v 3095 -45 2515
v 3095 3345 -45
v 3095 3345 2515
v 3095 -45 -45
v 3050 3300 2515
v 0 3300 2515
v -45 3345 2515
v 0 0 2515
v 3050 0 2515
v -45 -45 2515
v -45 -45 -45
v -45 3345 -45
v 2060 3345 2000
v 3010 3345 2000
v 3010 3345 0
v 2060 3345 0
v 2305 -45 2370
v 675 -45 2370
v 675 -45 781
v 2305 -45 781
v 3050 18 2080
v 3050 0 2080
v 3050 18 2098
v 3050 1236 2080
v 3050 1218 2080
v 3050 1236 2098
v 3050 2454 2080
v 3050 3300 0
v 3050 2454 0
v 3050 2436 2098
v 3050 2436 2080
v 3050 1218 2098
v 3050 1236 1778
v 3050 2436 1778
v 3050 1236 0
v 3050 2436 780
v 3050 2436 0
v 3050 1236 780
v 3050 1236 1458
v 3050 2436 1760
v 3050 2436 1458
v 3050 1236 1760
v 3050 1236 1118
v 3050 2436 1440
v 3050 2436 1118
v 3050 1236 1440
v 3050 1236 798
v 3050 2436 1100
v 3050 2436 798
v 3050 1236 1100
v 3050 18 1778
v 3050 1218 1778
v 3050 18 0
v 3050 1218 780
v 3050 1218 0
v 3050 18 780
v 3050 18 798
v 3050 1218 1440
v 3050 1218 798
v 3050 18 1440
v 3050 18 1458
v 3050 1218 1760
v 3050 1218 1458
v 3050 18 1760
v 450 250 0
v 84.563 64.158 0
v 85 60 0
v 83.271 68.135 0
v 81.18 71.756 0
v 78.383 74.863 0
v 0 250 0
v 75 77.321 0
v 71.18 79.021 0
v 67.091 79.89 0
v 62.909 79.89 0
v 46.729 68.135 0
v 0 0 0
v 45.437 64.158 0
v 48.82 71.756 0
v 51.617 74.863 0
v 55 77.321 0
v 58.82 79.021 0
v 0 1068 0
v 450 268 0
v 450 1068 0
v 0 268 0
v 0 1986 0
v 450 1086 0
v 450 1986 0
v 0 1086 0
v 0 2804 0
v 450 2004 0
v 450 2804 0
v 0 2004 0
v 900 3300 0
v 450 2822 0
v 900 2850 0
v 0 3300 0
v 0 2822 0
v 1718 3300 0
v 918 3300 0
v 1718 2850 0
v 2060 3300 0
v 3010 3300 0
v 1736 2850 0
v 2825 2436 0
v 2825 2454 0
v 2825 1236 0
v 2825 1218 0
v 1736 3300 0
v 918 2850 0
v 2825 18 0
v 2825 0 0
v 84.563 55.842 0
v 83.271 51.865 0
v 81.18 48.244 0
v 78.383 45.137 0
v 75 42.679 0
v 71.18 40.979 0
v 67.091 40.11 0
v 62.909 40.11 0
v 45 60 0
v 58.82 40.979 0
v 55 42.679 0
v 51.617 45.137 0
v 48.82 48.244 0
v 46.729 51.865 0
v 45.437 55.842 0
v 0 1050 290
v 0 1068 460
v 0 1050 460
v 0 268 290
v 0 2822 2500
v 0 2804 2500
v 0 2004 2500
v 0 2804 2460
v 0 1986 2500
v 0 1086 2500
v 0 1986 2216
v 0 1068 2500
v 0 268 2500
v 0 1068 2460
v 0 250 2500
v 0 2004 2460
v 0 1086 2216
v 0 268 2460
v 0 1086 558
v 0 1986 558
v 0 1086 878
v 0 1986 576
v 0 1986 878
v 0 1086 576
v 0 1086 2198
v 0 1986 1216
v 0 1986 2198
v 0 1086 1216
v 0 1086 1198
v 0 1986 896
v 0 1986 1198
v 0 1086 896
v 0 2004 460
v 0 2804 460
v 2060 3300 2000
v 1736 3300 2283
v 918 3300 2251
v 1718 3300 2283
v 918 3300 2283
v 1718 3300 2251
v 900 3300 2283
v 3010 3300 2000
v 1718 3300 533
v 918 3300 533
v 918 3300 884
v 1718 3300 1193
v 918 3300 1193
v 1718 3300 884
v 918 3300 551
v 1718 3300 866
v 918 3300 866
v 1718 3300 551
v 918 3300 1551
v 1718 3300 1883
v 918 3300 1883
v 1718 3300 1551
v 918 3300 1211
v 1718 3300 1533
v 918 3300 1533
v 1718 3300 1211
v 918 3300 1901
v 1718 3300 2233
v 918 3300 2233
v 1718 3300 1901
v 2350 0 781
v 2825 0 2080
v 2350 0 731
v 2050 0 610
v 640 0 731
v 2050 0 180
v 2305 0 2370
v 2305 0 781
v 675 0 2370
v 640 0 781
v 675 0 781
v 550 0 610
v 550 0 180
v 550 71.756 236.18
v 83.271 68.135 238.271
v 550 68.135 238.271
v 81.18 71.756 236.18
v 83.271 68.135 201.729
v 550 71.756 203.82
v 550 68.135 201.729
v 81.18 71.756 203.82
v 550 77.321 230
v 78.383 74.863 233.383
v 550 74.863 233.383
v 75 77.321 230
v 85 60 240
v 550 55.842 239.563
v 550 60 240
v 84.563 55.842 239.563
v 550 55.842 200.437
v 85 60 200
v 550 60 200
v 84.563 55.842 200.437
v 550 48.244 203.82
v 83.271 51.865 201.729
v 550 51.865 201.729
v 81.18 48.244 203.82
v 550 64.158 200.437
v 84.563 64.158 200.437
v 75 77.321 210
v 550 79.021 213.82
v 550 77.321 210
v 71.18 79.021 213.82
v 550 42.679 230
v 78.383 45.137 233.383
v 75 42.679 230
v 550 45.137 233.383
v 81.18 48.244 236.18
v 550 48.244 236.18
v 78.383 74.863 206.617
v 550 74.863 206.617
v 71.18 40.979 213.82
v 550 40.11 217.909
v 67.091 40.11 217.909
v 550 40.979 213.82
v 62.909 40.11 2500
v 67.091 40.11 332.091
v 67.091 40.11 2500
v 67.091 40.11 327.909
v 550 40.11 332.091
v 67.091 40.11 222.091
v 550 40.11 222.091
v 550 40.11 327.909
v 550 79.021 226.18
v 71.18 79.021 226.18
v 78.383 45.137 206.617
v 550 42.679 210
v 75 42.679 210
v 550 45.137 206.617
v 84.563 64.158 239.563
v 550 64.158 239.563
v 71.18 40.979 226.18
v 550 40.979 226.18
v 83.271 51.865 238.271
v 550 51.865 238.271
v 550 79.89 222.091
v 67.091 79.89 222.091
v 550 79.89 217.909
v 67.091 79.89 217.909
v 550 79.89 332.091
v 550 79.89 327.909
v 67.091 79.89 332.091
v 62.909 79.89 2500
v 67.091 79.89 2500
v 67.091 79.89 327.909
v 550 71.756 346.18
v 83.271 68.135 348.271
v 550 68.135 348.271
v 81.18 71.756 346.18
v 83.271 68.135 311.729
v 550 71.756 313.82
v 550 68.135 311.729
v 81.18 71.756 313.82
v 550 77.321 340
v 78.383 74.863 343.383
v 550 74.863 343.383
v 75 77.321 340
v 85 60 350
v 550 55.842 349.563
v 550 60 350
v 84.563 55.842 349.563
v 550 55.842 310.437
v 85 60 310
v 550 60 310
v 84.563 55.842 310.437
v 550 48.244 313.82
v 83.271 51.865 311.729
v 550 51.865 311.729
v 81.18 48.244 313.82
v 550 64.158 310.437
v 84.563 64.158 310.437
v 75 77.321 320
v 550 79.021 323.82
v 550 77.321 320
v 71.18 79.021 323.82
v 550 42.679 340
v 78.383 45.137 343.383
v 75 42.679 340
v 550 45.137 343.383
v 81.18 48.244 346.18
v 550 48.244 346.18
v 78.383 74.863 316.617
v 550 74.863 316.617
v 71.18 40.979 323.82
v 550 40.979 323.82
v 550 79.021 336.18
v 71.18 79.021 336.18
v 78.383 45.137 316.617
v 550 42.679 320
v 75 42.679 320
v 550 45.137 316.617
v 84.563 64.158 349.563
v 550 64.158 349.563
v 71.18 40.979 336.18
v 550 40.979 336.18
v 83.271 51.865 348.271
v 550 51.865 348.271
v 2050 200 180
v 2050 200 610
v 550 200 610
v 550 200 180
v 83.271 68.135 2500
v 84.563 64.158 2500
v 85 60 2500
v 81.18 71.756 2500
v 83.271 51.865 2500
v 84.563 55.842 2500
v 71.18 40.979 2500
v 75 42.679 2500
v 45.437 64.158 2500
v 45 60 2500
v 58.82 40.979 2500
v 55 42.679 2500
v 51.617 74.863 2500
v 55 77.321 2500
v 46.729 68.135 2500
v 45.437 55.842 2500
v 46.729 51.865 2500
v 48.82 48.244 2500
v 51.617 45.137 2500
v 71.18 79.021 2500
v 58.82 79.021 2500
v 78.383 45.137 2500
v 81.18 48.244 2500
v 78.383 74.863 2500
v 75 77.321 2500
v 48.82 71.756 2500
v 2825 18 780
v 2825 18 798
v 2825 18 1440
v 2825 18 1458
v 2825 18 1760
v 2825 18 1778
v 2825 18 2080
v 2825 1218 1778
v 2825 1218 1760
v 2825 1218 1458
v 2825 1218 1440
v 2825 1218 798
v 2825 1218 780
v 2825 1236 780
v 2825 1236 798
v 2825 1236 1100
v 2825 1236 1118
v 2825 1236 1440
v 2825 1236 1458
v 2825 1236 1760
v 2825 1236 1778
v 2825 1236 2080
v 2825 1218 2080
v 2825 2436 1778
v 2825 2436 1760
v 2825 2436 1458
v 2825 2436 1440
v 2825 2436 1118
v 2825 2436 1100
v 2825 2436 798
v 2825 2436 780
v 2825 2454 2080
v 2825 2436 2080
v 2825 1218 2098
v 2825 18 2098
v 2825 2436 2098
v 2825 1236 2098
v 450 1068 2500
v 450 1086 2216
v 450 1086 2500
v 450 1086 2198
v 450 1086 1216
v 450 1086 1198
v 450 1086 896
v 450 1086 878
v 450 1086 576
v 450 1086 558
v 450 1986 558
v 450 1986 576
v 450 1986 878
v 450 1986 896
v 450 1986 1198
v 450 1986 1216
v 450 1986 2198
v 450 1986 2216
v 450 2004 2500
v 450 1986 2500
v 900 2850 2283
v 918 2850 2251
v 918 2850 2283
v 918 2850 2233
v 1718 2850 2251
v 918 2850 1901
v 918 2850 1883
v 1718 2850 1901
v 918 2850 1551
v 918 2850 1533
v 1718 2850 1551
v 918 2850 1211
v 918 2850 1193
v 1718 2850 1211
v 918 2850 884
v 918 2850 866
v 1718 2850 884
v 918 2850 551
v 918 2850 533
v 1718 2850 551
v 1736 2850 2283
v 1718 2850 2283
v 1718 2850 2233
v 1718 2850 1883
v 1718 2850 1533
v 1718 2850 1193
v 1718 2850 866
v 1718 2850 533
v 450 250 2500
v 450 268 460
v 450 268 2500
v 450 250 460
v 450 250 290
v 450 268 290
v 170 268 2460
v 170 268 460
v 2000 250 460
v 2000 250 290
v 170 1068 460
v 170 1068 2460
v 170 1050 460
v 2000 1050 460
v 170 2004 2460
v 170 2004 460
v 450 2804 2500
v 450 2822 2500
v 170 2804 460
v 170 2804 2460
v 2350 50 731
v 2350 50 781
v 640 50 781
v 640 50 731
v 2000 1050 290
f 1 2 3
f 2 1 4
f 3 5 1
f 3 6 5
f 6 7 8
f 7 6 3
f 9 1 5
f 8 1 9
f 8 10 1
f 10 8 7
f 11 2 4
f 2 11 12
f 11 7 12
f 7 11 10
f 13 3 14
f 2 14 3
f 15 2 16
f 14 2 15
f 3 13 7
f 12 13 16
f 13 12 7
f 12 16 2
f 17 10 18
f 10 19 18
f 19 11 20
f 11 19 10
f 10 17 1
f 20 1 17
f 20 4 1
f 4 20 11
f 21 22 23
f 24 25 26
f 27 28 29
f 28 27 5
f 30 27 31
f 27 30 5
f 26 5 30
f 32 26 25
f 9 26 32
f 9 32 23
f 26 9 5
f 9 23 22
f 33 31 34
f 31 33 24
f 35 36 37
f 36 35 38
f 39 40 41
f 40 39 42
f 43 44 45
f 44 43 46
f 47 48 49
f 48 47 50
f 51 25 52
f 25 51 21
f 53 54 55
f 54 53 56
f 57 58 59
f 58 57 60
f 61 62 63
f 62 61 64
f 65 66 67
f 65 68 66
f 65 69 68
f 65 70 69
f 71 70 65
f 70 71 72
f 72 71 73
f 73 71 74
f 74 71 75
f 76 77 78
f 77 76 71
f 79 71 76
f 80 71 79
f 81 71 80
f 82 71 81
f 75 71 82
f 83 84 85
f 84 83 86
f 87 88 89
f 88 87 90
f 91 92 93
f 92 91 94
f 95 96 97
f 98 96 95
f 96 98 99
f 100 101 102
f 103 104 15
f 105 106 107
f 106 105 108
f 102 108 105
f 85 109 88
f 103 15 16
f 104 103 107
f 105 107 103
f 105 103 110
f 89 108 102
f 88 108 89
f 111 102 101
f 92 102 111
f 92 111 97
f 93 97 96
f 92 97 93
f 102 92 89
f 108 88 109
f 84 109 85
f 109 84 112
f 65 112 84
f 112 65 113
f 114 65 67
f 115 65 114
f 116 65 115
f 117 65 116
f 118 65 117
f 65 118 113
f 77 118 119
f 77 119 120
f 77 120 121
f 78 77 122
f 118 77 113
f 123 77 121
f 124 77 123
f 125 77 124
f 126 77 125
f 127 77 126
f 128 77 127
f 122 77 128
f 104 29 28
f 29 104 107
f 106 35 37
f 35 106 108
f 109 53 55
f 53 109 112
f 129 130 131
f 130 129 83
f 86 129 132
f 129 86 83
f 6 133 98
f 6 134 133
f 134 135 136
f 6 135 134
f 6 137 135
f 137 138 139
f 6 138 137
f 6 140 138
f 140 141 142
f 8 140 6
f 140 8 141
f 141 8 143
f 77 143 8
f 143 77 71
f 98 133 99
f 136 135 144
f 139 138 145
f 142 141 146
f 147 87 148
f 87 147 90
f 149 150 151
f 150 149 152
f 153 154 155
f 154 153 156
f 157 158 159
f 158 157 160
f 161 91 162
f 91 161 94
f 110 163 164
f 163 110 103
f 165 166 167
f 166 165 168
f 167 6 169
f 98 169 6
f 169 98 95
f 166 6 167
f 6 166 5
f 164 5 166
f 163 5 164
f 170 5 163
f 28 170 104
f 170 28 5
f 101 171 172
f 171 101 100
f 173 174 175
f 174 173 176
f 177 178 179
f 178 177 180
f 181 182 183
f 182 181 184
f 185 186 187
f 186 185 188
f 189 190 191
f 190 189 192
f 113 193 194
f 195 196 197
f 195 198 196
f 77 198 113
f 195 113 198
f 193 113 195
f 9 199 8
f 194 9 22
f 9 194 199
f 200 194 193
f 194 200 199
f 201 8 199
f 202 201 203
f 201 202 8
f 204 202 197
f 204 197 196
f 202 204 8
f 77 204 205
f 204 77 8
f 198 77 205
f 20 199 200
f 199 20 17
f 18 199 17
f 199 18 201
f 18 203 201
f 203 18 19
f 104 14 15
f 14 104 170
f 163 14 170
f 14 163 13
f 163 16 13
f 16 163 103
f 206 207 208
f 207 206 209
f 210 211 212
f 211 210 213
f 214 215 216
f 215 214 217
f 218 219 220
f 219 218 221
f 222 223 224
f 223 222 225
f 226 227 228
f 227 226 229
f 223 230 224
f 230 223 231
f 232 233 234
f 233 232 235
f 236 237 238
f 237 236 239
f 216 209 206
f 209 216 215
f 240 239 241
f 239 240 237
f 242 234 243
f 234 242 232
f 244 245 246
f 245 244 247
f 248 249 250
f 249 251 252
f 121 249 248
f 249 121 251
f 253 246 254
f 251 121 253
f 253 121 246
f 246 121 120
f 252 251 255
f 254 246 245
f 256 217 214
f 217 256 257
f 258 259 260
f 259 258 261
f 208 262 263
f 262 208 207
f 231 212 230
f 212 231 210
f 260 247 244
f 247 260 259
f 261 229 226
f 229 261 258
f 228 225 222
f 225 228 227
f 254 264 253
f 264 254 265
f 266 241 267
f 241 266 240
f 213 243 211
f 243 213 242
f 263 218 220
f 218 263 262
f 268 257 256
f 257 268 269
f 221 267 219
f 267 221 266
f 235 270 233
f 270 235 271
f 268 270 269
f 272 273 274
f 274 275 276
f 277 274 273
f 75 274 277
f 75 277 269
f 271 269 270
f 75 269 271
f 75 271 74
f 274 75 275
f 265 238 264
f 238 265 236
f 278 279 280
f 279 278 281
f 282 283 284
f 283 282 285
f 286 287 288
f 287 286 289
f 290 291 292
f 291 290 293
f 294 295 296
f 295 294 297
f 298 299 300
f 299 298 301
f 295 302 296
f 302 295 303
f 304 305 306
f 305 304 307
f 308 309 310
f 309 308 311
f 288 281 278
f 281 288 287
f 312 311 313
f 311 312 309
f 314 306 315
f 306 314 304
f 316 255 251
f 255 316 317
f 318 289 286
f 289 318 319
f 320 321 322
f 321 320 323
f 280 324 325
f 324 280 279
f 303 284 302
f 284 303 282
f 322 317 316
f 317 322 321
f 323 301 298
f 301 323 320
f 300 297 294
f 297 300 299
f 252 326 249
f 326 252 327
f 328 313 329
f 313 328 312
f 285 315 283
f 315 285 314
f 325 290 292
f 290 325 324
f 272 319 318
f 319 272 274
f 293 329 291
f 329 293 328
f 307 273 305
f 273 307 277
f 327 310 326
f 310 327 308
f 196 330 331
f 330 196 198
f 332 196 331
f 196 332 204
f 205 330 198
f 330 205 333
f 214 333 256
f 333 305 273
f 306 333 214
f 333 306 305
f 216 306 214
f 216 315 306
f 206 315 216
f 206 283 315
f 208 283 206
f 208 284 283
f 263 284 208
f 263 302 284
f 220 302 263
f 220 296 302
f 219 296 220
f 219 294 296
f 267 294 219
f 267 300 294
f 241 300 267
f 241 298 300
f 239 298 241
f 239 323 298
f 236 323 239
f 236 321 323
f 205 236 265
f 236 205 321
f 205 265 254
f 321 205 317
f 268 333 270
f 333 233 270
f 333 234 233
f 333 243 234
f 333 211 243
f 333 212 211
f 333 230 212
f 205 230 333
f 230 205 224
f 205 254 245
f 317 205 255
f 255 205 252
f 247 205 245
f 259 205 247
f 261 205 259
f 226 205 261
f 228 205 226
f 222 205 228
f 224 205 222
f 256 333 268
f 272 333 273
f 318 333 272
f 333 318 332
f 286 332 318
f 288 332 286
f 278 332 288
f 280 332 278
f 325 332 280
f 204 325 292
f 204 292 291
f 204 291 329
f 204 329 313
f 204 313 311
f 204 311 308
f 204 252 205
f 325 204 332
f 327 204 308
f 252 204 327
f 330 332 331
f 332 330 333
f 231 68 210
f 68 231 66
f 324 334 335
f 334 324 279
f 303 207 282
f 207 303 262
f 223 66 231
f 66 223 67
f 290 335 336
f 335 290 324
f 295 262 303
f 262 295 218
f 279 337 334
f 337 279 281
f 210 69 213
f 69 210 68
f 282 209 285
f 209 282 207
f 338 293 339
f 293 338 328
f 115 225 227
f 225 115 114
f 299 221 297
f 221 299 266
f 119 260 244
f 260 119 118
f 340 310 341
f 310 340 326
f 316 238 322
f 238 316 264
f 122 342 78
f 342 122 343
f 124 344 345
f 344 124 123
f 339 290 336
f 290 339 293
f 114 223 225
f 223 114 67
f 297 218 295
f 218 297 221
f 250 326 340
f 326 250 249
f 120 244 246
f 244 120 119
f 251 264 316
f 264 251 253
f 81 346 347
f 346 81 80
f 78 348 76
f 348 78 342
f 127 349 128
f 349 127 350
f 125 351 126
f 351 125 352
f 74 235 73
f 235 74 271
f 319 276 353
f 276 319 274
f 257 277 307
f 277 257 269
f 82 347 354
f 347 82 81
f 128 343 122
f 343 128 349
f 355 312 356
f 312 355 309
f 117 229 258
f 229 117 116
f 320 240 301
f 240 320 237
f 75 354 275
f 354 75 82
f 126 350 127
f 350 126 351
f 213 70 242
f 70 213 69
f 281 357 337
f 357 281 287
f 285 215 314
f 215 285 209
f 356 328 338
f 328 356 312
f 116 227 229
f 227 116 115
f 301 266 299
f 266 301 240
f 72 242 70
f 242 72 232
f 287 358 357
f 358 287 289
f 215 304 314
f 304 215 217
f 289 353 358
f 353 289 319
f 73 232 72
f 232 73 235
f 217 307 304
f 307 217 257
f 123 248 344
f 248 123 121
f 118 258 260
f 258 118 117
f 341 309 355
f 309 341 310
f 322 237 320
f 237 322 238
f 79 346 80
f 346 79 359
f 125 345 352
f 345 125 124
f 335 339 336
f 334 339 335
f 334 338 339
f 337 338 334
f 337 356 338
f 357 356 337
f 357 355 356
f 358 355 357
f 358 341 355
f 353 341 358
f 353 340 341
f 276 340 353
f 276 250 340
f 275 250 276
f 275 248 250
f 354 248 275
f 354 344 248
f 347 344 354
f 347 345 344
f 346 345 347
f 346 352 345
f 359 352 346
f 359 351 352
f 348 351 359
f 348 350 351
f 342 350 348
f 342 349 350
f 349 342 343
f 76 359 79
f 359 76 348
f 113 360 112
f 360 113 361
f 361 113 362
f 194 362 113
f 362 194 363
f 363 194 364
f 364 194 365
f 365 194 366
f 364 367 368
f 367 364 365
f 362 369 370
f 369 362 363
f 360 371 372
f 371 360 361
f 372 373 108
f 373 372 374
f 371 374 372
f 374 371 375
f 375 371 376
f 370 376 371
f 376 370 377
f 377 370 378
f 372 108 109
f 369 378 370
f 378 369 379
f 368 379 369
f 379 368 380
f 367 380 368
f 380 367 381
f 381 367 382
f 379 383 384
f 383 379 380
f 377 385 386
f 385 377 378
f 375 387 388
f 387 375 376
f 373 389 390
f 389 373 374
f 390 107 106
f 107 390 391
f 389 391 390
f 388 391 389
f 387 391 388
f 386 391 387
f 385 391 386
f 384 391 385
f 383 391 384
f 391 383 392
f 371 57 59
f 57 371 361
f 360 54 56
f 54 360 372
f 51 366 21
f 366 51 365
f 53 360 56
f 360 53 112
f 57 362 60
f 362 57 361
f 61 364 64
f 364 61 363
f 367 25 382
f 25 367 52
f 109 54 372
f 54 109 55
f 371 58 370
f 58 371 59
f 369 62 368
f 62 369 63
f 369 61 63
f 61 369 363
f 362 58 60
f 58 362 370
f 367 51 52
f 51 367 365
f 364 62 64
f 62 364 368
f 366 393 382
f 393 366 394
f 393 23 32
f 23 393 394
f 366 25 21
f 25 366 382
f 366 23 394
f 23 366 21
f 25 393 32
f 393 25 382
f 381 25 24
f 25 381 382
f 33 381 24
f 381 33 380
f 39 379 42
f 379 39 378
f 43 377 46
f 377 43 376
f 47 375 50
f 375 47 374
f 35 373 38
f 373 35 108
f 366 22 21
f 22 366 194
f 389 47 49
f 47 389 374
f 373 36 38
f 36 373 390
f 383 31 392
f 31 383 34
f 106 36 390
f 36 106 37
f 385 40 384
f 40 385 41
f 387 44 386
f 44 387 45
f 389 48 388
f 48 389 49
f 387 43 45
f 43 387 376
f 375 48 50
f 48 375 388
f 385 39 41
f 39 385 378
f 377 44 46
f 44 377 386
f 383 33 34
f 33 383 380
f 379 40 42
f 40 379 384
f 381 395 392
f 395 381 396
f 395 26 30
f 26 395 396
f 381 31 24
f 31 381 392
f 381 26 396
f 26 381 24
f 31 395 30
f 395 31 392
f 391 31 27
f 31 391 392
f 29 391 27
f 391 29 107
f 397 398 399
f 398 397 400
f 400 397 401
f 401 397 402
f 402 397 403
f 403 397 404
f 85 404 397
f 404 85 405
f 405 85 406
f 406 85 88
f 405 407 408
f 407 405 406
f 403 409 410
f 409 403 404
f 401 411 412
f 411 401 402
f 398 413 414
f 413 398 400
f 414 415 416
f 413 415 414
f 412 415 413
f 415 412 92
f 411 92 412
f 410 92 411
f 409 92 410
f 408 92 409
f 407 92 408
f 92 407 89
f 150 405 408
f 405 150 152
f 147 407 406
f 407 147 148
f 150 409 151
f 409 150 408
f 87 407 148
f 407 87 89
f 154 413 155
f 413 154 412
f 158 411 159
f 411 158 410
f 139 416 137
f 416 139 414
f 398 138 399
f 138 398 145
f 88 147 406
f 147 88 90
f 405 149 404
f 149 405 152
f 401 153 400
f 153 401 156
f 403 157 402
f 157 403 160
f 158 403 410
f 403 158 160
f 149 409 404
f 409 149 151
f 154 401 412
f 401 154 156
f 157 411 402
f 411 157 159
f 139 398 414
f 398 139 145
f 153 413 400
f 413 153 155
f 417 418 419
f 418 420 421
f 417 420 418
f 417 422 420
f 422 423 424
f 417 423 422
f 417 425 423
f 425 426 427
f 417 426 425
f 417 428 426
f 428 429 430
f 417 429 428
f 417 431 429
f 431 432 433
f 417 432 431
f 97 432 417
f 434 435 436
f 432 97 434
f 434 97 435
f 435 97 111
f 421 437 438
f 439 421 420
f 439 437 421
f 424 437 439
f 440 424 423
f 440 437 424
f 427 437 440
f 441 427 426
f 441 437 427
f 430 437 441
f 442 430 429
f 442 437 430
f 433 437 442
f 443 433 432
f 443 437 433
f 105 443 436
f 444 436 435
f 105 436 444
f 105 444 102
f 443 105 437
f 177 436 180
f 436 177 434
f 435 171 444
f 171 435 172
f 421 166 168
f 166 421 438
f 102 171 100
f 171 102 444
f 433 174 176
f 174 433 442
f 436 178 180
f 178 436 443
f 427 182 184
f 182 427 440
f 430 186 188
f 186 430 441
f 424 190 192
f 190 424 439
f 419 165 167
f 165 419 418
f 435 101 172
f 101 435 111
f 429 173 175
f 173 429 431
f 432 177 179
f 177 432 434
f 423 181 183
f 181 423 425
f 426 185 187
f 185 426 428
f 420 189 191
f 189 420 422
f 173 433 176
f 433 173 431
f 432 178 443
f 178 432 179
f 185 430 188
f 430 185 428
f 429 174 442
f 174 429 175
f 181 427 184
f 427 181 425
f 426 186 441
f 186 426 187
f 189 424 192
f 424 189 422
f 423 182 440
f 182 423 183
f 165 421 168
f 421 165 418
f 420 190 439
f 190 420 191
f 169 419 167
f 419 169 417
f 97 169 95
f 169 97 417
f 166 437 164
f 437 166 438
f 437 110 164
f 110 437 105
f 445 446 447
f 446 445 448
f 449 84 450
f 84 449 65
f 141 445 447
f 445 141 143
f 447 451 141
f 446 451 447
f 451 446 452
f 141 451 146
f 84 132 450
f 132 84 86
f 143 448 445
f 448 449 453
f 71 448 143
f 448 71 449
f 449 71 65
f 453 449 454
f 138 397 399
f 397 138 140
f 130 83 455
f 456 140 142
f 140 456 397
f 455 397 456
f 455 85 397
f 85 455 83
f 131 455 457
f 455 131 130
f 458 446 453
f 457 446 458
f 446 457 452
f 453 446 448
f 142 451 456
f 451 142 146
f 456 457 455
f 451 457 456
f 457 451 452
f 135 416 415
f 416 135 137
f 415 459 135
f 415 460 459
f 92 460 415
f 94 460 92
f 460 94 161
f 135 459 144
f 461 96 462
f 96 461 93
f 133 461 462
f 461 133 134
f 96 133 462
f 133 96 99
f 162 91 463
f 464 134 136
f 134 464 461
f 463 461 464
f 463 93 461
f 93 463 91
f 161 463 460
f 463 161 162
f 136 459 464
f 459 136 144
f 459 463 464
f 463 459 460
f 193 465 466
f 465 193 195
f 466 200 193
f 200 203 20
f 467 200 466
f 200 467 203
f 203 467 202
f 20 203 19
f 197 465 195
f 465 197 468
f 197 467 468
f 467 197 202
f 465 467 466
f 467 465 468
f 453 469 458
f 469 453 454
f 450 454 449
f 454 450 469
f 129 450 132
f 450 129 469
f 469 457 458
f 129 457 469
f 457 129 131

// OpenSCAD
/*
Based on the layout of the II-57 series house
tipdoma.com/2009/10/ceriya-ii-57/
*/


// ===========================================================
// ===========================================================
// !!! BLOCK OF ROOM`S BASE!!!
// SIZES (high, lenght, width)
room_high = 2560;
room_length = 3300;
room_width = 3050;
// wall`s thickness
room_thick_wall = 90;
// window`s cube
window_high = 1590;
window_length = 1630;
window_width = room_thick_wall * 2;
// window`s coord by wall
dX_window = 675;
dY_window = -room_thick_wall;
dZ_window = 780;
// door`s cube
door_high = 2000;
door_length = 950;
door_width = room_thick_wall * 2;
// door`s ccord by wall
door_X = room_width - door_length - 40;
// ===========================================================
// !!! DRAW ROOM BASE !!!
//set white color for all
color("lightsalmon", 1)
{
    difference()
    {
        // base for draw walls of room
        translate([-room_thick_wall/2, -room_thick_wall/2, -room_thick_wall/2])
        cube([room_width + room_thick_wall, room_length+room_thick_wall, room_high]);

        // base for room self
        translate([0, 0, 0])
        cube([room_width, room_length, room_high]);
        
        // base for draw window
        translate([dX_window, dY_window, dZ_window])
        cube([window_length, window_width, window_high]);
    
        // base for door
        translate([door_X, room_length-room_thick_wall/2, 0])
        cube([door_length, door_width, door_high]);
    }
}


// ===========================================================
// ===========================================================
// !!! BLOCK OF WINDOWSILL !!!
// SIZES
windowsill_length = 1710;
windowsill_width = 95;
windowsill_high = 50;
dX_windowsill = 640;
dY_windowsill = -45;
dZ_windowsill = 731;
// ===========================================================
// !!! draw windowsill !!!
color("white", 1)
rotate([0, 0, 0])
translate([dX_windowsill, dY_windowsill, dZ_windowsill])
cube([windowsill_length, windowsill_width, windowsill_high]);

// ===========================================================
// ===========================================================
// !!! BLOCK OF RADIATOR !!!
// SIZES
boiler_length = 1500;
boiler_width = 200;
boiler_high = 430;
dX_boiler = 550;
dY_boiler = 0;
dZ_boiler = 180;
// ===========================================================
// !!! DRAW RADIATOR SET !!!
color("white", 1)
{
// !!! draw radiator !!!
    rotate([0, 0, 0])
    translate([dX_boiler, dY_boiler, dZ_boiler])
    cube([boiler_length, boiler_width, boiler_high]);
// !!! draw vertical tube !!!
    rotate([0, 0, 0])
    translate([65, 60, 0])
    cylinder(r=20, h=2500, center=false);
// !!! draw horizontal tube !!! h = [22, 33]cm
    for(dZ=[220, 330])
    {
        translate([65, 60, dZ])
        rotate([0, 90, 0])
        cylinder(r=20, h=dX_boiler, center=false);
    }
}

// ===========================================================
// ===========================================================
// !!! BLOCK OF SHELF !!!
// SIZES
// constant of shelves
shelf_thick = 18;
shelf_width_S = 225;
shelf_width_L = 450;
shelf_color = "lightyellow";
// MODULE for DRAW one shelf
// The arguments >
// > size=shelf_width_S or shelf_width_L (width 22.5cm or 45cm)
// > length (length of this shelf)
module shelf_draw(size, length)
{
    cube([size, length, shelf_thick]);
};

// constant of rack

// sizes of rack 001 (near the window)
size_001 = shelf_width_S;
length_001 = 1200;
shelves_high_001 = [780, 1440, 1760, 2080];
rack_stand_001 = [2030+50, 2030+50];
// sizes of rack 002 (next near the window)
size_002 = shelf_width_S;
length_002 = 1200;
shelves_high_002 = [780, 1100, 1440, 1760, 2080];
rack_stand_002 = [2030+50, 0];
// sizes of rack 003 (between bads)
size_003 = shelf_width_L;
length_003 = 900;
shelves_high_003 = [558, 878, 1198, 2198];
rack_stand_003 = [0, 0];
// sizes of rack 004 (near the wardrobe)
size_004 = shelf_width_L;
length_004 = 800;
shelves_high_004 = [533, 866, 1193, 1533, 1883, 2233];
rack_stand_004 = [2233+50, 2233+50];
// MODULE for DRAW one rack
// The arguments >
// > size=shelf_width_S or shelf_width_L (width 22.5cm or 45cm)
// > length=??mm (length of this shelf)
// > shelves_high=[??mm] (list of shelf heights from the floor)
// > rack_stand=[left, right] (rack design: list if height of each rack)
module rack_draw(size, length, shelves_high, rack_stand)
{
    color(shelf_color , 1)
    for(j=[0, 2, 1])
    {
        if(j<2)
        {
            translate([0,(length+shelf_thick)*j,0])
            cube([size, shelf_thick, rack_stand[j]]);
        }
        else
        {
	        for(h=shelves_high)
	    	{
	    		translate([0,shelf_thick,h])
	        	shelf_draw(size, length);
	        }
	    }
	}
}

// ===========================================================
// !!! DRAW RACKS !!!
// !!! draw racks 001 !!!
translate([room_width,length_001+2*shelf_thick,0])
rotate([0,0,180])
rack_draw(size_001, length_001, shelves_high_001, rack_stand_001);
// !!! draw racks 002 !!!
translate([room_width,length_001+2*shelf_thick+length_002+shelf_thick,0])
rotate([0,0,180])
rack_draw(size_002, length_002, shelves_high_002, rack_stand_002);
// !!! draw racks 003 !!!
translate([0, dX_bad_L+bad_width+shelf_thick, 0])
rotate([0,0,0])
rack_draw(size_003, length_003, shelves_high_003, rack_stand_003);
// !!! draw racks 004 !!!
translate([900, room_length, 0])
rotate([0,0,-90])
rack_draw(size_004, length_004, shelves_high_004, rack_stand_004);

// ===========================================================
// !!! BLOCK OF WARDROBE`S SIZE !!!

// ===========================================================
// !!! BLOCK OF CABINET`S SIZE !!!


// ===========================================================
// ===========================================================
// !!! BLOCK OF BAD !!!
// SIZES
// sizes of bad
bad_length = 2000;
bad_width = 800;
bad_high = 170;
bad_color = "blueviolet";
dX_bad_L = 250;
dX_bad_R = dX_bad_L+bad_width+length_003+2*shelf_thick;
// MODULE for DRAW one bad
// The arguments >
module bad_draw()
{
    color(bad_color, 1)
    translate([bad_high, shelf_thick, 460])
	rotate([0, -90, 0])
	cube([bad_length, bad_width, bad_high]);
	translate([0, 0, 0])
	rack_draw(shelf_width_L, bad_width, [], [2500, 2500]);
}

// sizes of bad doors

// MODULE for DRAW one bad door
// The arguments >
// >
module bad_door_draw();
/*{
    color("lightyellow", 1)
    cube([size, length, shelf_thick]);
};*/

// MODULE for DRAW one 
// The arguments >
// >
module bad_door_draw();
/*{
    color("lightyellow", 1)
    cube([size, length, shelf_thick]);
};*/

// ===========================================================
// !!! DRAW BADS!!!

// !!! draw open bad !!!
color("red", 1)
rotate([0, 0, 0])
translate([0, dX_bad_L, 290])
cube([bad_length, bad_width, bad_high]);

// !!! draw close bad !!!
translate([0,dX_bad_L,0]) bad_draw();
translate([0,dX_bad_R,0]) bad_draw();

// !!! doors of bad !!!
